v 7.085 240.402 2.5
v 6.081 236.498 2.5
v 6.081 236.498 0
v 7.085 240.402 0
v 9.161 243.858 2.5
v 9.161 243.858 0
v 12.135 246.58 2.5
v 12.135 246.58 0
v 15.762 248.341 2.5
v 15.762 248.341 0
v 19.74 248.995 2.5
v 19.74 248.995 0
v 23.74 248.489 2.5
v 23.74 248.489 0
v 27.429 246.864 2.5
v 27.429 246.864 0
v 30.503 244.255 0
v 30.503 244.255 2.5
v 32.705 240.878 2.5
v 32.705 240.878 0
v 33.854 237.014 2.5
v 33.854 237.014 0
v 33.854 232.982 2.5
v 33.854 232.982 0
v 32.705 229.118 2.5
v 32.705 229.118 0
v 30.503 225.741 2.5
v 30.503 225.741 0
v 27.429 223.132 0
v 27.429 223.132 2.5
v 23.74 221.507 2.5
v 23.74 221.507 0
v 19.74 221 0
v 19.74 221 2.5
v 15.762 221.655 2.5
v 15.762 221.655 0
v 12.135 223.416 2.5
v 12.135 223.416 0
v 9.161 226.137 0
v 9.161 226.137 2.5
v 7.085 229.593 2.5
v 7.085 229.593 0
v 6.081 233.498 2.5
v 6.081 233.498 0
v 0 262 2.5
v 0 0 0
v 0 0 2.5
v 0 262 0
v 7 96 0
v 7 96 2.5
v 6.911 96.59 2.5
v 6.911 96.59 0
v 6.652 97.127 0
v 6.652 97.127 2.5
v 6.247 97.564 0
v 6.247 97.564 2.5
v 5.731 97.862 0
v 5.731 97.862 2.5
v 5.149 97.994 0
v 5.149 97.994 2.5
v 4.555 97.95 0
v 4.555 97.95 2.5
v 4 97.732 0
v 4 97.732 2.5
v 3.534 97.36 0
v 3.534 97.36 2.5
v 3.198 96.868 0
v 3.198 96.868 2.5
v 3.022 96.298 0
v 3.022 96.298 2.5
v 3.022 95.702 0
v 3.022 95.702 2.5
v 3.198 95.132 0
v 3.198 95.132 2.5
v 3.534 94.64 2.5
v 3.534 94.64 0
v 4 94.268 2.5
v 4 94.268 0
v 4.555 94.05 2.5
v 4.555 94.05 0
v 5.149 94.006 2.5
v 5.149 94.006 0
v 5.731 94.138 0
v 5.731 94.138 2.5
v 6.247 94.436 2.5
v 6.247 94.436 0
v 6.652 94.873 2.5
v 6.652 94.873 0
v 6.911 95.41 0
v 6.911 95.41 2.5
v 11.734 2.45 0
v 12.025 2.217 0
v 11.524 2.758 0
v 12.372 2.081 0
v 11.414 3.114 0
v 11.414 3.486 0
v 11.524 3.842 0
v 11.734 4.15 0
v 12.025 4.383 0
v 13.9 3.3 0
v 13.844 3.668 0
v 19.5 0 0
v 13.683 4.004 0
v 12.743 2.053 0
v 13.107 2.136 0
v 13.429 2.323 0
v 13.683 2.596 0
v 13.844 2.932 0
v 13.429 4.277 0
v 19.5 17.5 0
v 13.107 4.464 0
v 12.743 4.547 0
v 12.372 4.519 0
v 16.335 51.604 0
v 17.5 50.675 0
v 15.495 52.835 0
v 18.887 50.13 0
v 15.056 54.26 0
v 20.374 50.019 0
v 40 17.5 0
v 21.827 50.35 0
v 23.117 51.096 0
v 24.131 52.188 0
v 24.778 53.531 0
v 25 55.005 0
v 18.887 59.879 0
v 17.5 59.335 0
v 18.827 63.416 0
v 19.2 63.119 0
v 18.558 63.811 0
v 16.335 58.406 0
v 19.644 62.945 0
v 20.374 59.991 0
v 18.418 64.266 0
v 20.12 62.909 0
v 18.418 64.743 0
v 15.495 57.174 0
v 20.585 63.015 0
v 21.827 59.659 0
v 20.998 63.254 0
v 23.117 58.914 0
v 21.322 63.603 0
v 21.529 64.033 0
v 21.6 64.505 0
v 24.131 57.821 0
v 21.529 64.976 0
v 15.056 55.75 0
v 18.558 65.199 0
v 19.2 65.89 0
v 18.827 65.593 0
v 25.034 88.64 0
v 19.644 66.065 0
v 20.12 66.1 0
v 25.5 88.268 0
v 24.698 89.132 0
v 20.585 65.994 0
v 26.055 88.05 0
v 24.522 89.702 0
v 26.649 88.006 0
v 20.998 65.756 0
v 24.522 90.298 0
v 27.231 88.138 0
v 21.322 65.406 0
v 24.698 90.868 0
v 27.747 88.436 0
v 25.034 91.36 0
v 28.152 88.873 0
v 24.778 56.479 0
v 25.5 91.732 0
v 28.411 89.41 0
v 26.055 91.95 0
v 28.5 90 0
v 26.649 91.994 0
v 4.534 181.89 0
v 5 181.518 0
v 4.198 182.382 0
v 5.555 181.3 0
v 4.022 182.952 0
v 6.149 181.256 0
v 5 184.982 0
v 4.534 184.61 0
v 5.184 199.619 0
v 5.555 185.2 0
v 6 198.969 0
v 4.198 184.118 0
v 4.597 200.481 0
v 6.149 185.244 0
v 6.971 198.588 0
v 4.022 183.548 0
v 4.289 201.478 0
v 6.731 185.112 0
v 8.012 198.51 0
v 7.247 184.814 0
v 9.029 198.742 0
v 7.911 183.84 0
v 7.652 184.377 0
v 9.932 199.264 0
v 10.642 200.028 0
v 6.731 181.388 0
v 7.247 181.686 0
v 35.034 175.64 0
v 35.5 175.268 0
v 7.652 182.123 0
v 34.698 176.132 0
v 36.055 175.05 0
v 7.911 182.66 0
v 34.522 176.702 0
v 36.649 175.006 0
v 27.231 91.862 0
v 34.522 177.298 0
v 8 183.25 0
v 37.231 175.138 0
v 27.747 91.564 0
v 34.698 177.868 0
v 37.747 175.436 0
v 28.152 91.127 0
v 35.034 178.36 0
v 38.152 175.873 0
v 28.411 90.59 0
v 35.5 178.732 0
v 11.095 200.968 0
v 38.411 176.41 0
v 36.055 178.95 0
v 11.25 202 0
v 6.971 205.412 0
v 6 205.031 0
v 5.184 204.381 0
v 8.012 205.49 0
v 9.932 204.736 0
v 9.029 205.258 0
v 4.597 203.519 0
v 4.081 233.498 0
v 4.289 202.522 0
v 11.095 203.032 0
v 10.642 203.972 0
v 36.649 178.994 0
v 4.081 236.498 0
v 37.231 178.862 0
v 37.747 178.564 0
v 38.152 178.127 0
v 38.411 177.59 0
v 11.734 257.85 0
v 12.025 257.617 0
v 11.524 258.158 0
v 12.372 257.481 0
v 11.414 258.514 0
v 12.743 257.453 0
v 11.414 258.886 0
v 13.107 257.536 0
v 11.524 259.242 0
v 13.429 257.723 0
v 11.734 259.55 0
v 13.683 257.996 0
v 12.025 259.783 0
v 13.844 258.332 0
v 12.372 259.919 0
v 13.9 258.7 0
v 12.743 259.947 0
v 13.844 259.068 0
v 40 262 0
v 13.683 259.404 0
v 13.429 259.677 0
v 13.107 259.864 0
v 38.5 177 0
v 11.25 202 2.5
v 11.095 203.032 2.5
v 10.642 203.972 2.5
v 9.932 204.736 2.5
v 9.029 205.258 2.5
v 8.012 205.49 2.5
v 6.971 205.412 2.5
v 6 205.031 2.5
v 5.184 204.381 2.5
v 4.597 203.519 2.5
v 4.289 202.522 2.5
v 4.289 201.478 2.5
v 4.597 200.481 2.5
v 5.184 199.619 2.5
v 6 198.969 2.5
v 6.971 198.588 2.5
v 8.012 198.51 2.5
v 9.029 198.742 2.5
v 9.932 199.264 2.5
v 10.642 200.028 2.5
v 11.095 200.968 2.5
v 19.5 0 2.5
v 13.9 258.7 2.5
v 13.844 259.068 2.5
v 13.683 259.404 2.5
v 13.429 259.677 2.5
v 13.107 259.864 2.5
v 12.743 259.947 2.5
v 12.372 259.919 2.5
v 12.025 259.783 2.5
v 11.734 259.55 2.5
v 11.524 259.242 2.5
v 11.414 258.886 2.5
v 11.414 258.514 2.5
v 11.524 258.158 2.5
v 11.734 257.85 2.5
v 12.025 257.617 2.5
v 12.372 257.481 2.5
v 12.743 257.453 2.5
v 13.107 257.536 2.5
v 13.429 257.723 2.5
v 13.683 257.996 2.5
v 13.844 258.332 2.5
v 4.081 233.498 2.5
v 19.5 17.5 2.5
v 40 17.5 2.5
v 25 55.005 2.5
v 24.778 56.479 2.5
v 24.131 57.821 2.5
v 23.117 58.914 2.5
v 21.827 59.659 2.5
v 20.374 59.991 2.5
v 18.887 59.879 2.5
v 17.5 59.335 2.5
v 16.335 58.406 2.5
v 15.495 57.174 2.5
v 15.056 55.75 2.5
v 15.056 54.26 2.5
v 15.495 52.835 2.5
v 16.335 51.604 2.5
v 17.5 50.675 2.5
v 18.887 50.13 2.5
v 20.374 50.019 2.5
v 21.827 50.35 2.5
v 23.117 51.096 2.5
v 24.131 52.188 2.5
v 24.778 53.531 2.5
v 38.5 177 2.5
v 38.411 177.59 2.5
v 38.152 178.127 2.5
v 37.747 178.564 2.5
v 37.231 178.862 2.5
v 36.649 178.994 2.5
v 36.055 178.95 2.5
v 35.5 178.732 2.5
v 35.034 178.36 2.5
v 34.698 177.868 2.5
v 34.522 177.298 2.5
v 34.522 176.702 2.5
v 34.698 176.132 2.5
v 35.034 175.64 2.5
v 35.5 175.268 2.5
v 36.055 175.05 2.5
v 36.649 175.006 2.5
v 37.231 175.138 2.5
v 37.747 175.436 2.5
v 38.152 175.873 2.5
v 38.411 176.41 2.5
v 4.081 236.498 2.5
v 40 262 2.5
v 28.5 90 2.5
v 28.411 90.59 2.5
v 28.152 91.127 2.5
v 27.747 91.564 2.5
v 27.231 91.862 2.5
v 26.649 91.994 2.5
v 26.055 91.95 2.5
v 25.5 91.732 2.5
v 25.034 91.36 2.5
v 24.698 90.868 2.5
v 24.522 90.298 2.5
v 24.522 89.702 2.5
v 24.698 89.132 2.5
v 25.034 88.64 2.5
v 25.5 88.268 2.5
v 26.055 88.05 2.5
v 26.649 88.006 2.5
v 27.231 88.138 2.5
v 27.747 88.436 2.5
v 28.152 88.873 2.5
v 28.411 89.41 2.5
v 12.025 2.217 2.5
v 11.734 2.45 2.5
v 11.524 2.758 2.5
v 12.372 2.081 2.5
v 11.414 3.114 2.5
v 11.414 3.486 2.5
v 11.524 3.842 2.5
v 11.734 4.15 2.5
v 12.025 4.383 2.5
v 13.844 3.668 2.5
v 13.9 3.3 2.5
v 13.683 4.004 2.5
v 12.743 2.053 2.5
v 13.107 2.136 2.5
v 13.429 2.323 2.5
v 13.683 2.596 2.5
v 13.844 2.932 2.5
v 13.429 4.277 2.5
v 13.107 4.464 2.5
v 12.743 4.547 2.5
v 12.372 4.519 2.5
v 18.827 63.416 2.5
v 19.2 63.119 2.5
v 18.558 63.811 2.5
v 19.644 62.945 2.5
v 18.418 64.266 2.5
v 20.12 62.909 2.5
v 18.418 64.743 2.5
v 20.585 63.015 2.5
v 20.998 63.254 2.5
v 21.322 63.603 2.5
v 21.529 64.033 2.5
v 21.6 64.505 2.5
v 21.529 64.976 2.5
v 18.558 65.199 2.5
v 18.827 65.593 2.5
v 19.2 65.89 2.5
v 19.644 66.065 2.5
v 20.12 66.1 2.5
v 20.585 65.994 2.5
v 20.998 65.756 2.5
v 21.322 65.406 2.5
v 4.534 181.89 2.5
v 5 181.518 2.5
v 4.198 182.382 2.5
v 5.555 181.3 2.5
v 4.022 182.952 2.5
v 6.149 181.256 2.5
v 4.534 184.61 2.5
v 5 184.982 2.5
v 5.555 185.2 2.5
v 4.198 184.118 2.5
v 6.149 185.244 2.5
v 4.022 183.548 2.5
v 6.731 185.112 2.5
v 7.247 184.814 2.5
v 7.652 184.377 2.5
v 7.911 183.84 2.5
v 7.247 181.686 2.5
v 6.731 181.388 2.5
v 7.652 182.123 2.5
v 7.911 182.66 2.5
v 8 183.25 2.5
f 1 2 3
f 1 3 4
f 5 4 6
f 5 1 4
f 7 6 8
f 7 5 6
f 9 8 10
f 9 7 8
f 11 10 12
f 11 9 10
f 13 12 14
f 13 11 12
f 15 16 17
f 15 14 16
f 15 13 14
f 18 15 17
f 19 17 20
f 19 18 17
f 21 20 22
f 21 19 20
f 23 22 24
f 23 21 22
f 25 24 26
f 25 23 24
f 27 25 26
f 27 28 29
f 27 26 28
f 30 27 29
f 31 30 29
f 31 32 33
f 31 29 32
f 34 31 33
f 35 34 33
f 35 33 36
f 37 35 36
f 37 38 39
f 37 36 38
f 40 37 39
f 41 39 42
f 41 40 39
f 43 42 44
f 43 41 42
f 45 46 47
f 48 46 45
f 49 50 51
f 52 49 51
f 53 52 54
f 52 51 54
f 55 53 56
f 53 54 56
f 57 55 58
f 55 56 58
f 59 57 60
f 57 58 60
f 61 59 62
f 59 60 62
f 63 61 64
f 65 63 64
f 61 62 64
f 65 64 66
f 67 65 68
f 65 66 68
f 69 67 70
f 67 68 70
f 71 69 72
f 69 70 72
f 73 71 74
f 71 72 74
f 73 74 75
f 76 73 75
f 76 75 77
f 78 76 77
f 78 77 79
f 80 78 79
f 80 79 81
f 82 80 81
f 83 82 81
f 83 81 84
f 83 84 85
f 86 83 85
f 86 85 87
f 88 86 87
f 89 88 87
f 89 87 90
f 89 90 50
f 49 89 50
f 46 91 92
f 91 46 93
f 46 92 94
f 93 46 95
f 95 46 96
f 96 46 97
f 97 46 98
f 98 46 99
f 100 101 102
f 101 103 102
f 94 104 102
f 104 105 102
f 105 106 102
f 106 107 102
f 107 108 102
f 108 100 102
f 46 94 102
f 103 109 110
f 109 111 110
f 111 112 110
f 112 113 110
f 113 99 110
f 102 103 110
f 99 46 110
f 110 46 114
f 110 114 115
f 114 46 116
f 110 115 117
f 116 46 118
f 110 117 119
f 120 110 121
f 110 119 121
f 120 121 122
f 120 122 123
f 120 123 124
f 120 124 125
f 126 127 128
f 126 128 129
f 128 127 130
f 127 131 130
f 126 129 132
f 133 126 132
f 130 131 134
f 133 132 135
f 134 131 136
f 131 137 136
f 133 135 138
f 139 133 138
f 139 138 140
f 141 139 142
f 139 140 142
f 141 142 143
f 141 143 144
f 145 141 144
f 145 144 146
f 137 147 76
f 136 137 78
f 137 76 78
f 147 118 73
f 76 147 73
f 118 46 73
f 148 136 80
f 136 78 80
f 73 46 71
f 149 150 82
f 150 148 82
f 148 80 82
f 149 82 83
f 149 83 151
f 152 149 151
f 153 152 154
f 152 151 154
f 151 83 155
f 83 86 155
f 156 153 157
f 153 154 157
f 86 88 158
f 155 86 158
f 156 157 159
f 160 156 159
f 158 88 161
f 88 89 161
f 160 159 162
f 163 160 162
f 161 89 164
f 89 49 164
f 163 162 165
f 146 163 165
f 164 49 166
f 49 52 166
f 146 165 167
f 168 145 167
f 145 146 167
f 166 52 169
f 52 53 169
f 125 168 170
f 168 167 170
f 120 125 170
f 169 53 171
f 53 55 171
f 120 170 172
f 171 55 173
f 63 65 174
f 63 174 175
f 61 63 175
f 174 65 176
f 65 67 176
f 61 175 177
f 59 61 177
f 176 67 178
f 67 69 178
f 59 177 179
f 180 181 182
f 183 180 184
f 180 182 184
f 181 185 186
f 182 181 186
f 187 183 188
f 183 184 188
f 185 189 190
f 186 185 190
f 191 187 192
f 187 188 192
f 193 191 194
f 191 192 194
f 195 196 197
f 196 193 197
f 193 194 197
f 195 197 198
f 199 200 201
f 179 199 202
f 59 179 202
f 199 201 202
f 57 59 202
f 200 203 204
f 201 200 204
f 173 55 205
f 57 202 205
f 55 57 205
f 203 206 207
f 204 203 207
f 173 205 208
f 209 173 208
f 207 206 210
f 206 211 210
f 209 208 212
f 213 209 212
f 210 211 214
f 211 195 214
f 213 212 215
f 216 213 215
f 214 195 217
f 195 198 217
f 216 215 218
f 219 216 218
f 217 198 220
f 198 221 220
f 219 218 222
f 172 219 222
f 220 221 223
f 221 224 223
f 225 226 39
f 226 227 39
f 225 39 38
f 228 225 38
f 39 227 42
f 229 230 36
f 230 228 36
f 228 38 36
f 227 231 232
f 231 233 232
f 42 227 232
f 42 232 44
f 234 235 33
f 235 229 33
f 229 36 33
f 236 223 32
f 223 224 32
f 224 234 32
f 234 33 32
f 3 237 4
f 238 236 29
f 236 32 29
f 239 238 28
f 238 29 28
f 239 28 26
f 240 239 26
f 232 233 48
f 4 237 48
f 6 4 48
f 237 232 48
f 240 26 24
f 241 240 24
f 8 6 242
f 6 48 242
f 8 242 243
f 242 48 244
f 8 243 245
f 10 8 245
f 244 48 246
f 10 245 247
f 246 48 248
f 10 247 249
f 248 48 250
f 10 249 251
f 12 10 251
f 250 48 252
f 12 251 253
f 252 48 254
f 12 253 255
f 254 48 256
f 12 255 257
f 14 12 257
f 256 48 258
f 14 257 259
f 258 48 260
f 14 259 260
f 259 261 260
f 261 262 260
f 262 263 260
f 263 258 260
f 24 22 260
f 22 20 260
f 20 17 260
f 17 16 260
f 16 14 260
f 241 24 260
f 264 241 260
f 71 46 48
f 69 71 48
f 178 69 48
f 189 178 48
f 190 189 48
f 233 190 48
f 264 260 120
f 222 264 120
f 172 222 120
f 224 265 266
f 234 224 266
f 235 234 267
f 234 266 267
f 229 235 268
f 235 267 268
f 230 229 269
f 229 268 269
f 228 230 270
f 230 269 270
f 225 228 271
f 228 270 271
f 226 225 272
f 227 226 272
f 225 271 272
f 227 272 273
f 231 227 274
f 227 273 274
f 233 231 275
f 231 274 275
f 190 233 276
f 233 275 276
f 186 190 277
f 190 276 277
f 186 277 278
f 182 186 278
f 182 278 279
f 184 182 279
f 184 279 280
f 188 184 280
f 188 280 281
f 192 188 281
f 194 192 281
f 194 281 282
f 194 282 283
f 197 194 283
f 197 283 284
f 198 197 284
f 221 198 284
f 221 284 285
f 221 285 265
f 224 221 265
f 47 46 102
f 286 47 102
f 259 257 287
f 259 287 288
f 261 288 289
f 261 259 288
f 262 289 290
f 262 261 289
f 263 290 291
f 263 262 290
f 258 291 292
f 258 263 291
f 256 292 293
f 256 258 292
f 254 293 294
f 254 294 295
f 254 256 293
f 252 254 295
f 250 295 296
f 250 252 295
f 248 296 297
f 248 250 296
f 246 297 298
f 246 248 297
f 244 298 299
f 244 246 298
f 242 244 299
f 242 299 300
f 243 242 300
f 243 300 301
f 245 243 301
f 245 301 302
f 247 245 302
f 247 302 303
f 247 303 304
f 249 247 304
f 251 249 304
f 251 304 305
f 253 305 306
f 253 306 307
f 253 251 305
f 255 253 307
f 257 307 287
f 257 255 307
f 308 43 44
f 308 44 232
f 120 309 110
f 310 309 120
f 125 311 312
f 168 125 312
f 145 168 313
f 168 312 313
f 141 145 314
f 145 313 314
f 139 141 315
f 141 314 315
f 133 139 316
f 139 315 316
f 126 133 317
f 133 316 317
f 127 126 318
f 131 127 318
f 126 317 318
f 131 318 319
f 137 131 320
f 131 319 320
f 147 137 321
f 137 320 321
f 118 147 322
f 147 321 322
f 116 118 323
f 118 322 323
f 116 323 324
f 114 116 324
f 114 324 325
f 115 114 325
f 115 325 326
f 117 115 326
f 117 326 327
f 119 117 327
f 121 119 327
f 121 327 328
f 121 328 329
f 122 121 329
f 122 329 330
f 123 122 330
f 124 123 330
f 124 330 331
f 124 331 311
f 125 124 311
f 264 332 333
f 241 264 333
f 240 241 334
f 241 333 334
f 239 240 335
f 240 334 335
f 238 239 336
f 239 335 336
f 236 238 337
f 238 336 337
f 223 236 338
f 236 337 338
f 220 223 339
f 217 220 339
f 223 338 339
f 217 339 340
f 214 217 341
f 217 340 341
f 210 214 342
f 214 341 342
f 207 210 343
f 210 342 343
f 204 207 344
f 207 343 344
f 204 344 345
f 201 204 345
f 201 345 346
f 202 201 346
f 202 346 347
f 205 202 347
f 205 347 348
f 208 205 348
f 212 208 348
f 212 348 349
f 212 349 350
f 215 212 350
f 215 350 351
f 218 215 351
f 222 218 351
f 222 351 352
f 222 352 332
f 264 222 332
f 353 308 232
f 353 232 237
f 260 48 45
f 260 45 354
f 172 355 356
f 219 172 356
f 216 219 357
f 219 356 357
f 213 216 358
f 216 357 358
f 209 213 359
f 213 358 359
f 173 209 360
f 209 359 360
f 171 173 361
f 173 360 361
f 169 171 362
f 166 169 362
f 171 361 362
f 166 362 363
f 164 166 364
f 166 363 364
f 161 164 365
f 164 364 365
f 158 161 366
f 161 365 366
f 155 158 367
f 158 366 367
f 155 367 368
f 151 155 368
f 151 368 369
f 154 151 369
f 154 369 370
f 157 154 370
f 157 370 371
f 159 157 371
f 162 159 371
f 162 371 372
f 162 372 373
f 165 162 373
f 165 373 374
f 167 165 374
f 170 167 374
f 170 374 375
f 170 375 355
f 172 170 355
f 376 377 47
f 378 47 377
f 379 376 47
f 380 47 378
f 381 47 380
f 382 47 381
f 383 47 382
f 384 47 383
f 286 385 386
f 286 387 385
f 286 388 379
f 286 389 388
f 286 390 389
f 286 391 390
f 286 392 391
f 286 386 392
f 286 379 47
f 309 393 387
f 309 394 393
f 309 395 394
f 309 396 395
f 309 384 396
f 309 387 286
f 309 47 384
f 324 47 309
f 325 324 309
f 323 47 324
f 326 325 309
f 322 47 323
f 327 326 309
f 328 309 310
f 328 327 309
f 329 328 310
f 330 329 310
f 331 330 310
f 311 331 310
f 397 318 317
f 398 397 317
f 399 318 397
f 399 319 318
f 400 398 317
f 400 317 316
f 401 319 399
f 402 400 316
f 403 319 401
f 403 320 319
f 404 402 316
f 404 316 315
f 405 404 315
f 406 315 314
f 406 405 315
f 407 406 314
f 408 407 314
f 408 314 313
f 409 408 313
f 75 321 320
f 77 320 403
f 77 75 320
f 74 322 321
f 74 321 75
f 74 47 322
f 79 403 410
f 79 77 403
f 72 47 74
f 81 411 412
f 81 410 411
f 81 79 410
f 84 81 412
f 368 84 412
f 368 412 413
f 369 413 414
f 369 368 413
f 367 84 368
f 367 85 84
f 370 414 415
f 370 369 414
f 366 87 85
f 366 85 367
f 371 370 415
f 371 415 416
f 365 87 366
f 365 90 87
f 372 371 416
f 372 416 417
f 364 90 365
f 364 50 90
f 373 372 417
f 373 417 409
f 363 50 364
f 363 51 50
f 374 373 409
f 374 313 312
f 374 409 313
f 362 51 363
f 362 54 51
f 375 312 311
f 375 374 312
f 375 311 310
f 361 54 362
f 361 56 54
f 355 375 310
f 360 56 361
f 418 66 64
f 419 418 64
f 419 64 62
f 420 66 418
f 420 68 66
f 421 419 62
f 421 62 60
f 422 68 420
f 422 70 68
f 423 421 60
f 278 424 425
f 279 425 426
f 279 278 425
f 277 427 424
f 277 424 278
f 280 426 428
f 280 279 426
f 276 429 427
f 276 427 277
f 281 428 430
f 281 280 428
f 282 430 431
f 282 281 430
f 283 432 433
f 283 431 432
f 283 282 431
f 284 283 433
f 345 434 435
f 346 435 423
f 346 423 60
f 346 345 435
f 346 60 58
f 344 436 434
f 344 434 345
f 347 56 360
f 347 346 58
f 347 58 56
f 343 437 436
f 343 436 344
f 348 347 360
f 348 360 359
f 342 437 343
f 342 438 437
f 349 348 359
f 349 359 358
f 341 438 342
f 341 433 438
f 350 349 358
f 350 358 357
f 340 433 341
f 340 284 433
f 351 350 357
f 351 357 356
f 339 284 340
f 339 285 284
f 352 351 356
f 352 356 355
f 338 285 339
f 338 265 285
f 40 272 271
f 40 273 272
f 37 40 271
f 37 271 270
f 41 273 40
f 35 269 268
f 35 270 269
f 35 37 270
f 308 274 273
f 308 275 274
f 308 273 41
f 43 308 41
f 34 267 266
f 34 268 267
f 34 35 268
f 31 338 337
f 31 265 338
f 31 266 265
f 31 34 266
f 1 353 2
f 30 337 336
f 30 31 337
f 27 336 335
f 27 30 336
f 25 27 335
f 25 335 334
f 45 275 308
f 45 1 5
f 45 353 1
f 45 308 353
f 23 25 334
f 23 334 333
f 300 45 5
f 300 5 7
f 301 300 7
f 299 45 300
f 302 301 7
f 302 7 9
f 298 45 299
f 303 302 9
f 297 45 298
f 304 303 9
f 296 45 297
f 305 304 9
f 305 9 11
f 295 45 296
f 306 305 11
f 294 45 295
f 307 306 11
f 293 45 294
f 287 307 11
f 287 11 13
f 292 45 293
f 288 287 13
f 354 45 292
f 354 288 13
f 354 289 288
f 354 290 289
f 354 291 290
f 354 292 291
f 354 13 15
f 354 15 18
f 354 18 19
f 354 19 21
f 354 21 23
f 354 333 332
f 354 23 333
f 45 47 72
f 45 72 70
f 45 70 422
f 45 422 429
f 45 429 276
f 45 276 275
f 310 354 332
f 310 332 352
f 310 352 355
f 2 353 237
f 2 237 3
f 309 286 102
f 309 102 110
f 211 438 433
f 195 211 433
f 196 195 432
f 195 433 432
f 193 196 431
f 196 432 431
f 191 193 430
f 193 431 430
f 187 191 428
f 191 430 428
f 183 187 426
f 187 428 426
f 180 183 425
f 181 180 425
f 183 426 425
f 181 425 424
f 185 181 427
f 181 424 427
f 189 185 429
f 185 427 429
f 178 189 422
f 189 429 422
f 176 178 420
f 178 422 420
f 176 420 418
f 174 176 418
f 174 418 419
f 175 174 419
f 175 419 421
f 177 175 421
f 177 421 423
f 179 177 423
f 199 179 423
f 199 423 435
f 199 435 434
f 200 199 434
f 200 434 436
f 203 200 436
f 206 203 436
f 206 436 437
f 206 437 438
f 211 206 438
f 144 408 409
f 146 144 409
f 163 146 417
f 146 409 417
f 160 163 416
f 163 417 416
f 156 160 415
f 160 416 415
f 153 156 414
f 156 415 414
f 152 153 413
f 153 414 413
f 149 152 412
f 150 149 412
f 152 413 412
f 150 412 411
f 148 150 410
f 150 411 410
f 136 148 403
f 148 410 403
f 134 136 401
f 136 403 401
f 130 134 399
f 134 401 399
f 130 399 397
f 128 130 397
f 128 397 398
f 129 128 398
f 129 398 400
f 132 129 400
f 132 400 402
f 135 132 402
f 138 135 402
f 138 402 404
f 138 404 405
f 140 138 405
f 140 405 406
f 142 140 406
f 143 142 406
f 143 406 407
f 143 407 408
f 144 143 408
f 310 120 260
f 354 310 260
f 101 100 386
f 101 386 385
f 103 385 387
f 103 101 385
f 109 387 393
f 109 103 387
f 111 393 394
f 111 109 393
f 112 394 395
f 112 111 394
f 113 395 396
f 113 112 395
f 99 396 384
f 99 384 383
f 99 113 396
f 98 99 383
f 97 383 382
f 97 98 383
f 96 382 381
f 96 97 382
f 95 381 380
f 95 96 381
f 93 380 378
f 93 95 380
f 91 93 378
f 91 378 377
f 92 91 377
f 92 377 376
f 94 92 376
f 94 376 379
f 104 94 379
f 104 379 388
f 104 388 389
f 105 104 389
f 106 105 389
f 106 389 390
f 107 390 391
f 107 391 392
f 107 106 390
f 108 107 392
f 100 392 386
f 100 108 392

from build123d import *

# Parameters (mm, degrees)
SKETCH1_W           = 40
SKETCH1_H           = 262
SKETCH1_R           = 1.25
BOSS_EXTRUDE1_DEPTH = 2.5
SKETCH2_R           = 5
SKETCH2_R_2         = 1.6
SKETCH2_R_3         = 2
SKETCH2_R_4         = 3.5
CUT_EXTRUDE1_DEPTH  = 3.5
SKETCH3_W           = 20.5
SKETCH3_H           = 17.5
CUT_EXTRUDE2_DEPTH  = 3.5


with BuildPart() as part:
    # Sketch1 → Boss-Extrude1 (new body)
    with BuildSketch(Plane.XY):
        with Locations((20, 131)):
            Rectangle(SKETCH1_W, SKETCH1_H)
        with Locations((12.65, 258.7)):
            Circle(SKETCH1_R, mode=Mode.SUBTRACT)
        with Locations((12.65, 3.3)):
            Circle(SKETCH1_R, mode=Mode.SUBTRACT)
    extrude(amount=BOSS_EXTRUDE1_DEPTH)

    # Sketch2 → Cut-Extrude1 (cut, through all)
    with BuildSketch(Plane.XY.offset(2.5)):
        with Locations((20, 55.004773675)):
            Circle(SKETCH2_R)
        with Locations((20, 64.504773675)):
            Circle(SKETCH2_R_2)
        with Locations((5, 96)):
            Circle(SKETCH2_R_3)
        with Locations((26.5, 90)):
            Circle(SKETCH2_R_3)
        with Locations((36.5, 177)):
            Circle(SKETCH2_R_3)
        with Locations((6, 183.25)):
            Circle(SKETCH2_R_3)
        with Locations((7.75, 202)):
            Circle(SKETCH2_R_4)
        with BuildLine():
            Line((6.080589093, 233.49778539), (4.080589089, 233.49778539))
            Line((4.080589089, 233.49778539), (4.080589089, 236.49778539))
            Line((4.080589089, 236.49778539), (6.080589093, 236.49778539))
            ThreePointArc((6.080589093, 236.49778539), (34, 234.99778539), (6.080589093, 233.49778539))
        make_face()
    extrude(amount=-CUT_EXTRUDE1_DEPTH, mode=Mode.SUBTRACT)

    # Sketch3 → Cut-Extrude2 (cut, through all)
    with BuildSketch(Plane.XY.offset(2.5)):
        with Locations((29.75, 8.75)):
            Rectangle(SKETCH3_W, SKETCH3_H)
    extrude(amount=-CUT_EXTRUDE2_DEPTH, mode=Mode.SUBTRACT)


solid = part.part
